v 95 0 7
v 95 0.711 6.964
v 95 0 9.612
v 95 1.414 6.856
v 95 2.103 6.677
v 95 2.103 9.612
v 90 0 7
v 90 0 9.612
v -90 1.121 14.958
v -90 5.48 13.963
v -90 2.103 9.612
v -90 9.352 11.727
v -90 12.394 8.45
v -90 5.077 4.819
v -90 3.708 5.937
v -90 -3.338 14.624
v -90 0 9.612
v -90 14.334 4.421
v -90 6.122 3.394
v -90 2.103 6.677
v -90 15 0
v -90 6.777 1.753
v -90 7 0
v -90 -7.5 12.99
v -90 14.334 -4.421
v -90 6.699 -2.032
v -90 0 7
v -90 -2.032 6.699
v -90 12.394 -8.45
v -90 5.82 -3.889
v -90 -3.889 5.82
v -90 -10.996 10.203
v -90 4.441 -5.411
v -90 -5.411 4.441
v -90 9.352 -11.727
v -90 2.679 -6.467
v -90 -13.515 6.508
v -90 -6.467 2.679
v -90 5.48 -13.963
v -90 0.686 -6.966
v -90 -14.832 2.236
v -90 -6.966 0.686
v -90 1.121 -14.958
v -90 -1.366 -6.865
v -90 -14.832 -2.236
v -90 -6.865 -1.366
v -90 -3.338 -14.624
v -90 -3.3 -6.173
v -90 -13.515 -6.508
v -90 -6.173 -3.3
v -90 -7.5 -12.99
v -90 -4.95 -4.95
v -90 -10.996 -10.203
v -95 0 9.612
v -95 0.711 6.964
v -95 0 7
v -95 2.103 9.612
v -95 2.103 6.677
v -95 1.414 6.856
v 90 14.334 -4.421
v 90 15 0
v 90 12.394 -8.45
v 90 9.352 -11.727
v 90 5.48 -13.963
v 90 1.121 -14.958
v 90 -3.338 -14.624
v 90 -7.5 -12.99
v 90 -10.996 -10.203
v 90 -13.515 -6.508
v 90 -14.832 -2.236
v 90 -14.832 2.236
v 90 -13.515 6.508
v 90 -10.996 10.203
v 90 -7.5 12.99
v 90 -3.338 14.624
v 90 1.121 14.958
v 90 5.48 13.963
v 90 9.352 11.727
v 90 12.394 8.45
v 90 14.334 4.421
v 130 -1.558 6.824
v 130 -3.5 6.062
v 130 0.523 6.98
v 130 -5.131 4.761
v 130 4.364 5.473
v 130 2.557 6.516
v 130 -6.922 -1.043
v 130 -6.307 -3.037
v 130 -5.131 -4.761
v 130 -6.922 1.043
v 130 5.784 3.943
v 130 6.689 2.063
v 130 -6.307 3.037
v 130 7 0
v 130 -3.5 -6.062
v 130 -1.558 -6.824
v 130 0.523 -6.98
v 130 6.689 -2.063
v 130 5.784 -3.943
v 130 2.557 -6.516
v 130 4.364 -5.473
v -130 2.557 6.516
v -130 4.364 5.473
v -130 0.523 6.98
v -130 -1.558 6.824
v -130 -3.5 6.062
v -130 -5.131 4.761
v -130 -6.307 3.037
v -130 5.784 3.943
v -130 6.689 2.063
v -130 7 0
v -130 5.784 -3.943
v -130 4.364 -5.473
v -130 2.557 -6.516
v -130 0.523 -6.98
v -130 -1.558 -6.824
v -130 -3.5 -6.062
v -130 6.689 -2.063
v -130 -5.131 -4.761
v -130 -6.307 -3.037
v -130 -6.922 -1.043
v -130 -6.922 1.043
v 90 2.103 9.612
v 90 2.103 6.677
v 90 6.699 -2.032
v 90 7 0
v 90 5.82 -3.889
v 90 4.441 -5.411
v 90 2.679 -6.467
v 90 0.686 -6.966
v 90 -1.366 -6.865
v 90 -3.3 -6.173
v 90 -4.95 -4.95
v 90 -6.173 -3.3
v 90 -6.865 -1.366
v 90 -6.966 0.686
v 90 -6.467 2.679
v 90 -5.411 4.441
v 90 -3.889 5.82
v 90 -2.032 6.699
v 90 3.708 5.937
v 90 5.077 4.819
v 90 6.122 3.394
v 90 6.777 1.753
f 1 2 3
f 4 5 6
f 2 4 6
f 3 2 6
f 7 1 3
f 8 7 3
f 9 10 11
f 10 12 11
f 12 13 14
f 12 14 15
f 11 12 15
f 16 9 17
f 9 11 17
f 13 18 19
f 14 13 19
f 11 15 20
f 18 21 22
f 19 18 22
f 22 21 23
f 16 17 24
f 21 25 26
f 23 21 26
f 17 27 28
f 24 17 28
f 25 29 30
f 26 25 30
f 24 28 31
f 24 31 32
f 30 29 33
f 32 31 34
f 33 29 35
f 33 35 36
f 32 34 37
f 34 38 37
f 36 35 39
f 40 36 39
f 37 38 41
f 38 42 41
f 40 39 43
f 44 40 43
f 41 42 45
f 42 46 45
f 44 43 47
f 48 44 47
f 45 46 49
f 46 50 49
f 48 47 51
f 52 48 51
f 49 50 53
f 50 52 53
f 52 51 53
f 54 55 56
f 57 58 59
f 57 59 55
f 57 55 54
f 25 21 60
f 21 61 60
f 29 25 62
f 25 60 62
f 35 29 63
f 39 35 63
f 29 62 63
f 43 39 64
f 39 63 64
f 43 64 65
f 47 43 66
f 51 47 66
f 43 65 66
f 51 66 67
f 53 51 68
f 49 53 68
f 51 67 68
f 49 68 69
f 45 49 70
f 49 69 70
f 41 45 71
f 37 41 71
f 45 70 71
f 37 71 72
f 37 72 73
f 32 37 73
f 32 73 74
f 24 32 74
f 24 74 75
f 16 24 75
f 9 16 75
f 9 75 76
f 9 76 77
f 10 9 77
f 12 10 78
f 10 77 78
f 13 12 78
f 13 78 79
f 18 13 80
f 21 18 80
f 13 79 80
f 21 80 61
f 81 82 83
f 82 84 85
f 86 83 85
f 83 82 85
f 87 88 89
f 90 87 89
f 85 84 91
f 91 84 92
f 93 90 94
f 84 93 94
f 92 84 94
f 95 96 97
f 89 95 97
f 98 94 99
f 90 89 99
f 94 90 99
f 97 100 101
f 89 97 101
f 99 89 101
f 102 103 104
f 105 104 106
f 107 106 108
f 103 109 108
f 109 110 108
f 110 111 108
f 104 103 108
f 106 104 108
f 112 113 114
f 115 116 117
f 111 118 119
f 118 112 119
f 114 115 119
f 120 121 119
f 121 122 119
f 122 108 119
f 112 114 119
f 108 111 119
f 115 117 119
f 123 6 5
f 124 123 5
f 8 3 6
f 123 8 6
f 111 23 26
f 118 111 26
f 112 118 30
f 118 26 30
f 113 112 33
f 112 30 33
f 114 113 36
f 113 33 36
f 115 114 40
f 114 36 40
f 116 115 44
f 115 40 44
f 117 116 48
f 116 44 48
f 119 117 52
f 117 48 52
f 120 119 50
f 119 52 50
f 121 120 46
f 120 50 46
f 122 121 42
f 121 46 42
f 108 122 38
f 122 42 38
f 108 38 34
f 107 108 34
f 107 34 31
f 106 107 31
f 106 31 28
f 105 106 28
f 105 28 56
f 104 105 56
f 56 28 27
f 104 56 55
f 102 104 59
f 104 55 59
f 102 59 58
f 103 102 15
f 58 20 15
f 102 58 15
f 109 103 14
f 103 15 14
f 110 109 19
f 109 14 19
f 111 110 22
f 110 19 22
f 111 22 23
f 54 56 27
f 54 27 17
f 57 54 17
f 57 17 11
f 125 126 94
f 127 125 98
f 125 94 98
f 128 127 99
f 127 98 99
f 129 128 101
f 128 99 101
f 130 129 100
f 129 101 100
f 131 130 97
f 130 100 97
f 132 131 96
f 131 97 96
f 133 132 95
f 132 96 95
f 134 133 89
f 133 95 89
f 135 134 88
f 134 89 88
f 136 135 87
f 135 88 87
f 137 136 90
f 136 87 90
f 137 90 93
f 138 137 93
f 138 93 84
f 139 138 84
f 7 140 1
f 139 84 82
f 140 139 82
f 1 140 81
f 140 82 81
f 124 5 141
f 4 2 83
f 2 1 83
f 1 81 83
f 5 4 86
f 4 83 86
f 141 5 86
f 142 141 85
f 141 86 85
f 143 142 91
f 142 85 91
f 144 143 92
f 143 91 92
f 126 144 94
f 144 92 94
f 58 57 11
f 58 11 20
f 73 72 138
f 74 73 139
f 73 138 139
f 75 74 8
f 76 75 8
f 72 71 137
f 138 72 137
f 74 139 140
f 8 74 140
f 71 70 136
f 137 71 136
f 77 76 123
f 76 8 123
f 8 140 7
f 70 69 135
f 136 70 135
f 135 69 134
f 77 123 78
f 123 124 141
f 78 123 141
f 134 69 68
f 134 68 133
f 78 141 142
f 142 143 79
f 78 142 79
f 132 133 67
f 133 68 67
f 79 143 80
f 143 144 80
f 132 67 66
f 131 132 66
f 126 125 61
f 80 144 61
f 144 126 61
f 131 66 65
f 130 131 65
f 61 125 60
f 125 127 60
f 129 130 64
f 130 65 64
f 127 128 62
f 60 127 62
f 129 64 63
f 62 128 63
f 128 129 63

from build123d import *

# Parameters (mm, degrees)
BOSS_EXTRUDE1_START = 5
BOSS_EXTRUDE1_DEPTH = 5


with BuildPart() as part:
    # Sketch2 → Revolve1 (revolve)
    with BuildSketch(Plane.XY):
        Polygon((130, 0), (-130, 0), (-130, -7), (-90, -7), (-90, -15), (90, -15), (90, -7), (130, -7), align=None)
    revolve(axis=Axis((130, 0, 0), (-1, 0, 0)))

    # Sketch3 → Boss-Extrude1 (add)
    with BuildSketch(Plane(origin=(90, 0, 0), x_dir=(0, 0, -1), z_dir=(1, 0, 0)).offset(BOSS_EXTRUDE1_START)):
        with BuildLine():
            Line((-7, 0), (-9.611930855, 0))
            Line((-9.611930855, 0), (-9.611930855, 2.103316634))
            Line((-9.611930855, 2.103316634), (-6.676530471, 2.103316634))
            ThreePointArc((-6.676530471, 2.103316634), (-6.918660033, 1.064022251), (-7, 0))
        make_face()
    boss_extrude1 = extrude(amount=-BOSS_EXTRUDE1_DEPTH)

    # Mirror1: Boss-Extrude1 across plane
    add(boss_extrude1.mirror(Plane(origin=(0, 0, 0), x_dir=(0, 0, 1), z_dir=(1, 0, 0))))


solid = part.part
